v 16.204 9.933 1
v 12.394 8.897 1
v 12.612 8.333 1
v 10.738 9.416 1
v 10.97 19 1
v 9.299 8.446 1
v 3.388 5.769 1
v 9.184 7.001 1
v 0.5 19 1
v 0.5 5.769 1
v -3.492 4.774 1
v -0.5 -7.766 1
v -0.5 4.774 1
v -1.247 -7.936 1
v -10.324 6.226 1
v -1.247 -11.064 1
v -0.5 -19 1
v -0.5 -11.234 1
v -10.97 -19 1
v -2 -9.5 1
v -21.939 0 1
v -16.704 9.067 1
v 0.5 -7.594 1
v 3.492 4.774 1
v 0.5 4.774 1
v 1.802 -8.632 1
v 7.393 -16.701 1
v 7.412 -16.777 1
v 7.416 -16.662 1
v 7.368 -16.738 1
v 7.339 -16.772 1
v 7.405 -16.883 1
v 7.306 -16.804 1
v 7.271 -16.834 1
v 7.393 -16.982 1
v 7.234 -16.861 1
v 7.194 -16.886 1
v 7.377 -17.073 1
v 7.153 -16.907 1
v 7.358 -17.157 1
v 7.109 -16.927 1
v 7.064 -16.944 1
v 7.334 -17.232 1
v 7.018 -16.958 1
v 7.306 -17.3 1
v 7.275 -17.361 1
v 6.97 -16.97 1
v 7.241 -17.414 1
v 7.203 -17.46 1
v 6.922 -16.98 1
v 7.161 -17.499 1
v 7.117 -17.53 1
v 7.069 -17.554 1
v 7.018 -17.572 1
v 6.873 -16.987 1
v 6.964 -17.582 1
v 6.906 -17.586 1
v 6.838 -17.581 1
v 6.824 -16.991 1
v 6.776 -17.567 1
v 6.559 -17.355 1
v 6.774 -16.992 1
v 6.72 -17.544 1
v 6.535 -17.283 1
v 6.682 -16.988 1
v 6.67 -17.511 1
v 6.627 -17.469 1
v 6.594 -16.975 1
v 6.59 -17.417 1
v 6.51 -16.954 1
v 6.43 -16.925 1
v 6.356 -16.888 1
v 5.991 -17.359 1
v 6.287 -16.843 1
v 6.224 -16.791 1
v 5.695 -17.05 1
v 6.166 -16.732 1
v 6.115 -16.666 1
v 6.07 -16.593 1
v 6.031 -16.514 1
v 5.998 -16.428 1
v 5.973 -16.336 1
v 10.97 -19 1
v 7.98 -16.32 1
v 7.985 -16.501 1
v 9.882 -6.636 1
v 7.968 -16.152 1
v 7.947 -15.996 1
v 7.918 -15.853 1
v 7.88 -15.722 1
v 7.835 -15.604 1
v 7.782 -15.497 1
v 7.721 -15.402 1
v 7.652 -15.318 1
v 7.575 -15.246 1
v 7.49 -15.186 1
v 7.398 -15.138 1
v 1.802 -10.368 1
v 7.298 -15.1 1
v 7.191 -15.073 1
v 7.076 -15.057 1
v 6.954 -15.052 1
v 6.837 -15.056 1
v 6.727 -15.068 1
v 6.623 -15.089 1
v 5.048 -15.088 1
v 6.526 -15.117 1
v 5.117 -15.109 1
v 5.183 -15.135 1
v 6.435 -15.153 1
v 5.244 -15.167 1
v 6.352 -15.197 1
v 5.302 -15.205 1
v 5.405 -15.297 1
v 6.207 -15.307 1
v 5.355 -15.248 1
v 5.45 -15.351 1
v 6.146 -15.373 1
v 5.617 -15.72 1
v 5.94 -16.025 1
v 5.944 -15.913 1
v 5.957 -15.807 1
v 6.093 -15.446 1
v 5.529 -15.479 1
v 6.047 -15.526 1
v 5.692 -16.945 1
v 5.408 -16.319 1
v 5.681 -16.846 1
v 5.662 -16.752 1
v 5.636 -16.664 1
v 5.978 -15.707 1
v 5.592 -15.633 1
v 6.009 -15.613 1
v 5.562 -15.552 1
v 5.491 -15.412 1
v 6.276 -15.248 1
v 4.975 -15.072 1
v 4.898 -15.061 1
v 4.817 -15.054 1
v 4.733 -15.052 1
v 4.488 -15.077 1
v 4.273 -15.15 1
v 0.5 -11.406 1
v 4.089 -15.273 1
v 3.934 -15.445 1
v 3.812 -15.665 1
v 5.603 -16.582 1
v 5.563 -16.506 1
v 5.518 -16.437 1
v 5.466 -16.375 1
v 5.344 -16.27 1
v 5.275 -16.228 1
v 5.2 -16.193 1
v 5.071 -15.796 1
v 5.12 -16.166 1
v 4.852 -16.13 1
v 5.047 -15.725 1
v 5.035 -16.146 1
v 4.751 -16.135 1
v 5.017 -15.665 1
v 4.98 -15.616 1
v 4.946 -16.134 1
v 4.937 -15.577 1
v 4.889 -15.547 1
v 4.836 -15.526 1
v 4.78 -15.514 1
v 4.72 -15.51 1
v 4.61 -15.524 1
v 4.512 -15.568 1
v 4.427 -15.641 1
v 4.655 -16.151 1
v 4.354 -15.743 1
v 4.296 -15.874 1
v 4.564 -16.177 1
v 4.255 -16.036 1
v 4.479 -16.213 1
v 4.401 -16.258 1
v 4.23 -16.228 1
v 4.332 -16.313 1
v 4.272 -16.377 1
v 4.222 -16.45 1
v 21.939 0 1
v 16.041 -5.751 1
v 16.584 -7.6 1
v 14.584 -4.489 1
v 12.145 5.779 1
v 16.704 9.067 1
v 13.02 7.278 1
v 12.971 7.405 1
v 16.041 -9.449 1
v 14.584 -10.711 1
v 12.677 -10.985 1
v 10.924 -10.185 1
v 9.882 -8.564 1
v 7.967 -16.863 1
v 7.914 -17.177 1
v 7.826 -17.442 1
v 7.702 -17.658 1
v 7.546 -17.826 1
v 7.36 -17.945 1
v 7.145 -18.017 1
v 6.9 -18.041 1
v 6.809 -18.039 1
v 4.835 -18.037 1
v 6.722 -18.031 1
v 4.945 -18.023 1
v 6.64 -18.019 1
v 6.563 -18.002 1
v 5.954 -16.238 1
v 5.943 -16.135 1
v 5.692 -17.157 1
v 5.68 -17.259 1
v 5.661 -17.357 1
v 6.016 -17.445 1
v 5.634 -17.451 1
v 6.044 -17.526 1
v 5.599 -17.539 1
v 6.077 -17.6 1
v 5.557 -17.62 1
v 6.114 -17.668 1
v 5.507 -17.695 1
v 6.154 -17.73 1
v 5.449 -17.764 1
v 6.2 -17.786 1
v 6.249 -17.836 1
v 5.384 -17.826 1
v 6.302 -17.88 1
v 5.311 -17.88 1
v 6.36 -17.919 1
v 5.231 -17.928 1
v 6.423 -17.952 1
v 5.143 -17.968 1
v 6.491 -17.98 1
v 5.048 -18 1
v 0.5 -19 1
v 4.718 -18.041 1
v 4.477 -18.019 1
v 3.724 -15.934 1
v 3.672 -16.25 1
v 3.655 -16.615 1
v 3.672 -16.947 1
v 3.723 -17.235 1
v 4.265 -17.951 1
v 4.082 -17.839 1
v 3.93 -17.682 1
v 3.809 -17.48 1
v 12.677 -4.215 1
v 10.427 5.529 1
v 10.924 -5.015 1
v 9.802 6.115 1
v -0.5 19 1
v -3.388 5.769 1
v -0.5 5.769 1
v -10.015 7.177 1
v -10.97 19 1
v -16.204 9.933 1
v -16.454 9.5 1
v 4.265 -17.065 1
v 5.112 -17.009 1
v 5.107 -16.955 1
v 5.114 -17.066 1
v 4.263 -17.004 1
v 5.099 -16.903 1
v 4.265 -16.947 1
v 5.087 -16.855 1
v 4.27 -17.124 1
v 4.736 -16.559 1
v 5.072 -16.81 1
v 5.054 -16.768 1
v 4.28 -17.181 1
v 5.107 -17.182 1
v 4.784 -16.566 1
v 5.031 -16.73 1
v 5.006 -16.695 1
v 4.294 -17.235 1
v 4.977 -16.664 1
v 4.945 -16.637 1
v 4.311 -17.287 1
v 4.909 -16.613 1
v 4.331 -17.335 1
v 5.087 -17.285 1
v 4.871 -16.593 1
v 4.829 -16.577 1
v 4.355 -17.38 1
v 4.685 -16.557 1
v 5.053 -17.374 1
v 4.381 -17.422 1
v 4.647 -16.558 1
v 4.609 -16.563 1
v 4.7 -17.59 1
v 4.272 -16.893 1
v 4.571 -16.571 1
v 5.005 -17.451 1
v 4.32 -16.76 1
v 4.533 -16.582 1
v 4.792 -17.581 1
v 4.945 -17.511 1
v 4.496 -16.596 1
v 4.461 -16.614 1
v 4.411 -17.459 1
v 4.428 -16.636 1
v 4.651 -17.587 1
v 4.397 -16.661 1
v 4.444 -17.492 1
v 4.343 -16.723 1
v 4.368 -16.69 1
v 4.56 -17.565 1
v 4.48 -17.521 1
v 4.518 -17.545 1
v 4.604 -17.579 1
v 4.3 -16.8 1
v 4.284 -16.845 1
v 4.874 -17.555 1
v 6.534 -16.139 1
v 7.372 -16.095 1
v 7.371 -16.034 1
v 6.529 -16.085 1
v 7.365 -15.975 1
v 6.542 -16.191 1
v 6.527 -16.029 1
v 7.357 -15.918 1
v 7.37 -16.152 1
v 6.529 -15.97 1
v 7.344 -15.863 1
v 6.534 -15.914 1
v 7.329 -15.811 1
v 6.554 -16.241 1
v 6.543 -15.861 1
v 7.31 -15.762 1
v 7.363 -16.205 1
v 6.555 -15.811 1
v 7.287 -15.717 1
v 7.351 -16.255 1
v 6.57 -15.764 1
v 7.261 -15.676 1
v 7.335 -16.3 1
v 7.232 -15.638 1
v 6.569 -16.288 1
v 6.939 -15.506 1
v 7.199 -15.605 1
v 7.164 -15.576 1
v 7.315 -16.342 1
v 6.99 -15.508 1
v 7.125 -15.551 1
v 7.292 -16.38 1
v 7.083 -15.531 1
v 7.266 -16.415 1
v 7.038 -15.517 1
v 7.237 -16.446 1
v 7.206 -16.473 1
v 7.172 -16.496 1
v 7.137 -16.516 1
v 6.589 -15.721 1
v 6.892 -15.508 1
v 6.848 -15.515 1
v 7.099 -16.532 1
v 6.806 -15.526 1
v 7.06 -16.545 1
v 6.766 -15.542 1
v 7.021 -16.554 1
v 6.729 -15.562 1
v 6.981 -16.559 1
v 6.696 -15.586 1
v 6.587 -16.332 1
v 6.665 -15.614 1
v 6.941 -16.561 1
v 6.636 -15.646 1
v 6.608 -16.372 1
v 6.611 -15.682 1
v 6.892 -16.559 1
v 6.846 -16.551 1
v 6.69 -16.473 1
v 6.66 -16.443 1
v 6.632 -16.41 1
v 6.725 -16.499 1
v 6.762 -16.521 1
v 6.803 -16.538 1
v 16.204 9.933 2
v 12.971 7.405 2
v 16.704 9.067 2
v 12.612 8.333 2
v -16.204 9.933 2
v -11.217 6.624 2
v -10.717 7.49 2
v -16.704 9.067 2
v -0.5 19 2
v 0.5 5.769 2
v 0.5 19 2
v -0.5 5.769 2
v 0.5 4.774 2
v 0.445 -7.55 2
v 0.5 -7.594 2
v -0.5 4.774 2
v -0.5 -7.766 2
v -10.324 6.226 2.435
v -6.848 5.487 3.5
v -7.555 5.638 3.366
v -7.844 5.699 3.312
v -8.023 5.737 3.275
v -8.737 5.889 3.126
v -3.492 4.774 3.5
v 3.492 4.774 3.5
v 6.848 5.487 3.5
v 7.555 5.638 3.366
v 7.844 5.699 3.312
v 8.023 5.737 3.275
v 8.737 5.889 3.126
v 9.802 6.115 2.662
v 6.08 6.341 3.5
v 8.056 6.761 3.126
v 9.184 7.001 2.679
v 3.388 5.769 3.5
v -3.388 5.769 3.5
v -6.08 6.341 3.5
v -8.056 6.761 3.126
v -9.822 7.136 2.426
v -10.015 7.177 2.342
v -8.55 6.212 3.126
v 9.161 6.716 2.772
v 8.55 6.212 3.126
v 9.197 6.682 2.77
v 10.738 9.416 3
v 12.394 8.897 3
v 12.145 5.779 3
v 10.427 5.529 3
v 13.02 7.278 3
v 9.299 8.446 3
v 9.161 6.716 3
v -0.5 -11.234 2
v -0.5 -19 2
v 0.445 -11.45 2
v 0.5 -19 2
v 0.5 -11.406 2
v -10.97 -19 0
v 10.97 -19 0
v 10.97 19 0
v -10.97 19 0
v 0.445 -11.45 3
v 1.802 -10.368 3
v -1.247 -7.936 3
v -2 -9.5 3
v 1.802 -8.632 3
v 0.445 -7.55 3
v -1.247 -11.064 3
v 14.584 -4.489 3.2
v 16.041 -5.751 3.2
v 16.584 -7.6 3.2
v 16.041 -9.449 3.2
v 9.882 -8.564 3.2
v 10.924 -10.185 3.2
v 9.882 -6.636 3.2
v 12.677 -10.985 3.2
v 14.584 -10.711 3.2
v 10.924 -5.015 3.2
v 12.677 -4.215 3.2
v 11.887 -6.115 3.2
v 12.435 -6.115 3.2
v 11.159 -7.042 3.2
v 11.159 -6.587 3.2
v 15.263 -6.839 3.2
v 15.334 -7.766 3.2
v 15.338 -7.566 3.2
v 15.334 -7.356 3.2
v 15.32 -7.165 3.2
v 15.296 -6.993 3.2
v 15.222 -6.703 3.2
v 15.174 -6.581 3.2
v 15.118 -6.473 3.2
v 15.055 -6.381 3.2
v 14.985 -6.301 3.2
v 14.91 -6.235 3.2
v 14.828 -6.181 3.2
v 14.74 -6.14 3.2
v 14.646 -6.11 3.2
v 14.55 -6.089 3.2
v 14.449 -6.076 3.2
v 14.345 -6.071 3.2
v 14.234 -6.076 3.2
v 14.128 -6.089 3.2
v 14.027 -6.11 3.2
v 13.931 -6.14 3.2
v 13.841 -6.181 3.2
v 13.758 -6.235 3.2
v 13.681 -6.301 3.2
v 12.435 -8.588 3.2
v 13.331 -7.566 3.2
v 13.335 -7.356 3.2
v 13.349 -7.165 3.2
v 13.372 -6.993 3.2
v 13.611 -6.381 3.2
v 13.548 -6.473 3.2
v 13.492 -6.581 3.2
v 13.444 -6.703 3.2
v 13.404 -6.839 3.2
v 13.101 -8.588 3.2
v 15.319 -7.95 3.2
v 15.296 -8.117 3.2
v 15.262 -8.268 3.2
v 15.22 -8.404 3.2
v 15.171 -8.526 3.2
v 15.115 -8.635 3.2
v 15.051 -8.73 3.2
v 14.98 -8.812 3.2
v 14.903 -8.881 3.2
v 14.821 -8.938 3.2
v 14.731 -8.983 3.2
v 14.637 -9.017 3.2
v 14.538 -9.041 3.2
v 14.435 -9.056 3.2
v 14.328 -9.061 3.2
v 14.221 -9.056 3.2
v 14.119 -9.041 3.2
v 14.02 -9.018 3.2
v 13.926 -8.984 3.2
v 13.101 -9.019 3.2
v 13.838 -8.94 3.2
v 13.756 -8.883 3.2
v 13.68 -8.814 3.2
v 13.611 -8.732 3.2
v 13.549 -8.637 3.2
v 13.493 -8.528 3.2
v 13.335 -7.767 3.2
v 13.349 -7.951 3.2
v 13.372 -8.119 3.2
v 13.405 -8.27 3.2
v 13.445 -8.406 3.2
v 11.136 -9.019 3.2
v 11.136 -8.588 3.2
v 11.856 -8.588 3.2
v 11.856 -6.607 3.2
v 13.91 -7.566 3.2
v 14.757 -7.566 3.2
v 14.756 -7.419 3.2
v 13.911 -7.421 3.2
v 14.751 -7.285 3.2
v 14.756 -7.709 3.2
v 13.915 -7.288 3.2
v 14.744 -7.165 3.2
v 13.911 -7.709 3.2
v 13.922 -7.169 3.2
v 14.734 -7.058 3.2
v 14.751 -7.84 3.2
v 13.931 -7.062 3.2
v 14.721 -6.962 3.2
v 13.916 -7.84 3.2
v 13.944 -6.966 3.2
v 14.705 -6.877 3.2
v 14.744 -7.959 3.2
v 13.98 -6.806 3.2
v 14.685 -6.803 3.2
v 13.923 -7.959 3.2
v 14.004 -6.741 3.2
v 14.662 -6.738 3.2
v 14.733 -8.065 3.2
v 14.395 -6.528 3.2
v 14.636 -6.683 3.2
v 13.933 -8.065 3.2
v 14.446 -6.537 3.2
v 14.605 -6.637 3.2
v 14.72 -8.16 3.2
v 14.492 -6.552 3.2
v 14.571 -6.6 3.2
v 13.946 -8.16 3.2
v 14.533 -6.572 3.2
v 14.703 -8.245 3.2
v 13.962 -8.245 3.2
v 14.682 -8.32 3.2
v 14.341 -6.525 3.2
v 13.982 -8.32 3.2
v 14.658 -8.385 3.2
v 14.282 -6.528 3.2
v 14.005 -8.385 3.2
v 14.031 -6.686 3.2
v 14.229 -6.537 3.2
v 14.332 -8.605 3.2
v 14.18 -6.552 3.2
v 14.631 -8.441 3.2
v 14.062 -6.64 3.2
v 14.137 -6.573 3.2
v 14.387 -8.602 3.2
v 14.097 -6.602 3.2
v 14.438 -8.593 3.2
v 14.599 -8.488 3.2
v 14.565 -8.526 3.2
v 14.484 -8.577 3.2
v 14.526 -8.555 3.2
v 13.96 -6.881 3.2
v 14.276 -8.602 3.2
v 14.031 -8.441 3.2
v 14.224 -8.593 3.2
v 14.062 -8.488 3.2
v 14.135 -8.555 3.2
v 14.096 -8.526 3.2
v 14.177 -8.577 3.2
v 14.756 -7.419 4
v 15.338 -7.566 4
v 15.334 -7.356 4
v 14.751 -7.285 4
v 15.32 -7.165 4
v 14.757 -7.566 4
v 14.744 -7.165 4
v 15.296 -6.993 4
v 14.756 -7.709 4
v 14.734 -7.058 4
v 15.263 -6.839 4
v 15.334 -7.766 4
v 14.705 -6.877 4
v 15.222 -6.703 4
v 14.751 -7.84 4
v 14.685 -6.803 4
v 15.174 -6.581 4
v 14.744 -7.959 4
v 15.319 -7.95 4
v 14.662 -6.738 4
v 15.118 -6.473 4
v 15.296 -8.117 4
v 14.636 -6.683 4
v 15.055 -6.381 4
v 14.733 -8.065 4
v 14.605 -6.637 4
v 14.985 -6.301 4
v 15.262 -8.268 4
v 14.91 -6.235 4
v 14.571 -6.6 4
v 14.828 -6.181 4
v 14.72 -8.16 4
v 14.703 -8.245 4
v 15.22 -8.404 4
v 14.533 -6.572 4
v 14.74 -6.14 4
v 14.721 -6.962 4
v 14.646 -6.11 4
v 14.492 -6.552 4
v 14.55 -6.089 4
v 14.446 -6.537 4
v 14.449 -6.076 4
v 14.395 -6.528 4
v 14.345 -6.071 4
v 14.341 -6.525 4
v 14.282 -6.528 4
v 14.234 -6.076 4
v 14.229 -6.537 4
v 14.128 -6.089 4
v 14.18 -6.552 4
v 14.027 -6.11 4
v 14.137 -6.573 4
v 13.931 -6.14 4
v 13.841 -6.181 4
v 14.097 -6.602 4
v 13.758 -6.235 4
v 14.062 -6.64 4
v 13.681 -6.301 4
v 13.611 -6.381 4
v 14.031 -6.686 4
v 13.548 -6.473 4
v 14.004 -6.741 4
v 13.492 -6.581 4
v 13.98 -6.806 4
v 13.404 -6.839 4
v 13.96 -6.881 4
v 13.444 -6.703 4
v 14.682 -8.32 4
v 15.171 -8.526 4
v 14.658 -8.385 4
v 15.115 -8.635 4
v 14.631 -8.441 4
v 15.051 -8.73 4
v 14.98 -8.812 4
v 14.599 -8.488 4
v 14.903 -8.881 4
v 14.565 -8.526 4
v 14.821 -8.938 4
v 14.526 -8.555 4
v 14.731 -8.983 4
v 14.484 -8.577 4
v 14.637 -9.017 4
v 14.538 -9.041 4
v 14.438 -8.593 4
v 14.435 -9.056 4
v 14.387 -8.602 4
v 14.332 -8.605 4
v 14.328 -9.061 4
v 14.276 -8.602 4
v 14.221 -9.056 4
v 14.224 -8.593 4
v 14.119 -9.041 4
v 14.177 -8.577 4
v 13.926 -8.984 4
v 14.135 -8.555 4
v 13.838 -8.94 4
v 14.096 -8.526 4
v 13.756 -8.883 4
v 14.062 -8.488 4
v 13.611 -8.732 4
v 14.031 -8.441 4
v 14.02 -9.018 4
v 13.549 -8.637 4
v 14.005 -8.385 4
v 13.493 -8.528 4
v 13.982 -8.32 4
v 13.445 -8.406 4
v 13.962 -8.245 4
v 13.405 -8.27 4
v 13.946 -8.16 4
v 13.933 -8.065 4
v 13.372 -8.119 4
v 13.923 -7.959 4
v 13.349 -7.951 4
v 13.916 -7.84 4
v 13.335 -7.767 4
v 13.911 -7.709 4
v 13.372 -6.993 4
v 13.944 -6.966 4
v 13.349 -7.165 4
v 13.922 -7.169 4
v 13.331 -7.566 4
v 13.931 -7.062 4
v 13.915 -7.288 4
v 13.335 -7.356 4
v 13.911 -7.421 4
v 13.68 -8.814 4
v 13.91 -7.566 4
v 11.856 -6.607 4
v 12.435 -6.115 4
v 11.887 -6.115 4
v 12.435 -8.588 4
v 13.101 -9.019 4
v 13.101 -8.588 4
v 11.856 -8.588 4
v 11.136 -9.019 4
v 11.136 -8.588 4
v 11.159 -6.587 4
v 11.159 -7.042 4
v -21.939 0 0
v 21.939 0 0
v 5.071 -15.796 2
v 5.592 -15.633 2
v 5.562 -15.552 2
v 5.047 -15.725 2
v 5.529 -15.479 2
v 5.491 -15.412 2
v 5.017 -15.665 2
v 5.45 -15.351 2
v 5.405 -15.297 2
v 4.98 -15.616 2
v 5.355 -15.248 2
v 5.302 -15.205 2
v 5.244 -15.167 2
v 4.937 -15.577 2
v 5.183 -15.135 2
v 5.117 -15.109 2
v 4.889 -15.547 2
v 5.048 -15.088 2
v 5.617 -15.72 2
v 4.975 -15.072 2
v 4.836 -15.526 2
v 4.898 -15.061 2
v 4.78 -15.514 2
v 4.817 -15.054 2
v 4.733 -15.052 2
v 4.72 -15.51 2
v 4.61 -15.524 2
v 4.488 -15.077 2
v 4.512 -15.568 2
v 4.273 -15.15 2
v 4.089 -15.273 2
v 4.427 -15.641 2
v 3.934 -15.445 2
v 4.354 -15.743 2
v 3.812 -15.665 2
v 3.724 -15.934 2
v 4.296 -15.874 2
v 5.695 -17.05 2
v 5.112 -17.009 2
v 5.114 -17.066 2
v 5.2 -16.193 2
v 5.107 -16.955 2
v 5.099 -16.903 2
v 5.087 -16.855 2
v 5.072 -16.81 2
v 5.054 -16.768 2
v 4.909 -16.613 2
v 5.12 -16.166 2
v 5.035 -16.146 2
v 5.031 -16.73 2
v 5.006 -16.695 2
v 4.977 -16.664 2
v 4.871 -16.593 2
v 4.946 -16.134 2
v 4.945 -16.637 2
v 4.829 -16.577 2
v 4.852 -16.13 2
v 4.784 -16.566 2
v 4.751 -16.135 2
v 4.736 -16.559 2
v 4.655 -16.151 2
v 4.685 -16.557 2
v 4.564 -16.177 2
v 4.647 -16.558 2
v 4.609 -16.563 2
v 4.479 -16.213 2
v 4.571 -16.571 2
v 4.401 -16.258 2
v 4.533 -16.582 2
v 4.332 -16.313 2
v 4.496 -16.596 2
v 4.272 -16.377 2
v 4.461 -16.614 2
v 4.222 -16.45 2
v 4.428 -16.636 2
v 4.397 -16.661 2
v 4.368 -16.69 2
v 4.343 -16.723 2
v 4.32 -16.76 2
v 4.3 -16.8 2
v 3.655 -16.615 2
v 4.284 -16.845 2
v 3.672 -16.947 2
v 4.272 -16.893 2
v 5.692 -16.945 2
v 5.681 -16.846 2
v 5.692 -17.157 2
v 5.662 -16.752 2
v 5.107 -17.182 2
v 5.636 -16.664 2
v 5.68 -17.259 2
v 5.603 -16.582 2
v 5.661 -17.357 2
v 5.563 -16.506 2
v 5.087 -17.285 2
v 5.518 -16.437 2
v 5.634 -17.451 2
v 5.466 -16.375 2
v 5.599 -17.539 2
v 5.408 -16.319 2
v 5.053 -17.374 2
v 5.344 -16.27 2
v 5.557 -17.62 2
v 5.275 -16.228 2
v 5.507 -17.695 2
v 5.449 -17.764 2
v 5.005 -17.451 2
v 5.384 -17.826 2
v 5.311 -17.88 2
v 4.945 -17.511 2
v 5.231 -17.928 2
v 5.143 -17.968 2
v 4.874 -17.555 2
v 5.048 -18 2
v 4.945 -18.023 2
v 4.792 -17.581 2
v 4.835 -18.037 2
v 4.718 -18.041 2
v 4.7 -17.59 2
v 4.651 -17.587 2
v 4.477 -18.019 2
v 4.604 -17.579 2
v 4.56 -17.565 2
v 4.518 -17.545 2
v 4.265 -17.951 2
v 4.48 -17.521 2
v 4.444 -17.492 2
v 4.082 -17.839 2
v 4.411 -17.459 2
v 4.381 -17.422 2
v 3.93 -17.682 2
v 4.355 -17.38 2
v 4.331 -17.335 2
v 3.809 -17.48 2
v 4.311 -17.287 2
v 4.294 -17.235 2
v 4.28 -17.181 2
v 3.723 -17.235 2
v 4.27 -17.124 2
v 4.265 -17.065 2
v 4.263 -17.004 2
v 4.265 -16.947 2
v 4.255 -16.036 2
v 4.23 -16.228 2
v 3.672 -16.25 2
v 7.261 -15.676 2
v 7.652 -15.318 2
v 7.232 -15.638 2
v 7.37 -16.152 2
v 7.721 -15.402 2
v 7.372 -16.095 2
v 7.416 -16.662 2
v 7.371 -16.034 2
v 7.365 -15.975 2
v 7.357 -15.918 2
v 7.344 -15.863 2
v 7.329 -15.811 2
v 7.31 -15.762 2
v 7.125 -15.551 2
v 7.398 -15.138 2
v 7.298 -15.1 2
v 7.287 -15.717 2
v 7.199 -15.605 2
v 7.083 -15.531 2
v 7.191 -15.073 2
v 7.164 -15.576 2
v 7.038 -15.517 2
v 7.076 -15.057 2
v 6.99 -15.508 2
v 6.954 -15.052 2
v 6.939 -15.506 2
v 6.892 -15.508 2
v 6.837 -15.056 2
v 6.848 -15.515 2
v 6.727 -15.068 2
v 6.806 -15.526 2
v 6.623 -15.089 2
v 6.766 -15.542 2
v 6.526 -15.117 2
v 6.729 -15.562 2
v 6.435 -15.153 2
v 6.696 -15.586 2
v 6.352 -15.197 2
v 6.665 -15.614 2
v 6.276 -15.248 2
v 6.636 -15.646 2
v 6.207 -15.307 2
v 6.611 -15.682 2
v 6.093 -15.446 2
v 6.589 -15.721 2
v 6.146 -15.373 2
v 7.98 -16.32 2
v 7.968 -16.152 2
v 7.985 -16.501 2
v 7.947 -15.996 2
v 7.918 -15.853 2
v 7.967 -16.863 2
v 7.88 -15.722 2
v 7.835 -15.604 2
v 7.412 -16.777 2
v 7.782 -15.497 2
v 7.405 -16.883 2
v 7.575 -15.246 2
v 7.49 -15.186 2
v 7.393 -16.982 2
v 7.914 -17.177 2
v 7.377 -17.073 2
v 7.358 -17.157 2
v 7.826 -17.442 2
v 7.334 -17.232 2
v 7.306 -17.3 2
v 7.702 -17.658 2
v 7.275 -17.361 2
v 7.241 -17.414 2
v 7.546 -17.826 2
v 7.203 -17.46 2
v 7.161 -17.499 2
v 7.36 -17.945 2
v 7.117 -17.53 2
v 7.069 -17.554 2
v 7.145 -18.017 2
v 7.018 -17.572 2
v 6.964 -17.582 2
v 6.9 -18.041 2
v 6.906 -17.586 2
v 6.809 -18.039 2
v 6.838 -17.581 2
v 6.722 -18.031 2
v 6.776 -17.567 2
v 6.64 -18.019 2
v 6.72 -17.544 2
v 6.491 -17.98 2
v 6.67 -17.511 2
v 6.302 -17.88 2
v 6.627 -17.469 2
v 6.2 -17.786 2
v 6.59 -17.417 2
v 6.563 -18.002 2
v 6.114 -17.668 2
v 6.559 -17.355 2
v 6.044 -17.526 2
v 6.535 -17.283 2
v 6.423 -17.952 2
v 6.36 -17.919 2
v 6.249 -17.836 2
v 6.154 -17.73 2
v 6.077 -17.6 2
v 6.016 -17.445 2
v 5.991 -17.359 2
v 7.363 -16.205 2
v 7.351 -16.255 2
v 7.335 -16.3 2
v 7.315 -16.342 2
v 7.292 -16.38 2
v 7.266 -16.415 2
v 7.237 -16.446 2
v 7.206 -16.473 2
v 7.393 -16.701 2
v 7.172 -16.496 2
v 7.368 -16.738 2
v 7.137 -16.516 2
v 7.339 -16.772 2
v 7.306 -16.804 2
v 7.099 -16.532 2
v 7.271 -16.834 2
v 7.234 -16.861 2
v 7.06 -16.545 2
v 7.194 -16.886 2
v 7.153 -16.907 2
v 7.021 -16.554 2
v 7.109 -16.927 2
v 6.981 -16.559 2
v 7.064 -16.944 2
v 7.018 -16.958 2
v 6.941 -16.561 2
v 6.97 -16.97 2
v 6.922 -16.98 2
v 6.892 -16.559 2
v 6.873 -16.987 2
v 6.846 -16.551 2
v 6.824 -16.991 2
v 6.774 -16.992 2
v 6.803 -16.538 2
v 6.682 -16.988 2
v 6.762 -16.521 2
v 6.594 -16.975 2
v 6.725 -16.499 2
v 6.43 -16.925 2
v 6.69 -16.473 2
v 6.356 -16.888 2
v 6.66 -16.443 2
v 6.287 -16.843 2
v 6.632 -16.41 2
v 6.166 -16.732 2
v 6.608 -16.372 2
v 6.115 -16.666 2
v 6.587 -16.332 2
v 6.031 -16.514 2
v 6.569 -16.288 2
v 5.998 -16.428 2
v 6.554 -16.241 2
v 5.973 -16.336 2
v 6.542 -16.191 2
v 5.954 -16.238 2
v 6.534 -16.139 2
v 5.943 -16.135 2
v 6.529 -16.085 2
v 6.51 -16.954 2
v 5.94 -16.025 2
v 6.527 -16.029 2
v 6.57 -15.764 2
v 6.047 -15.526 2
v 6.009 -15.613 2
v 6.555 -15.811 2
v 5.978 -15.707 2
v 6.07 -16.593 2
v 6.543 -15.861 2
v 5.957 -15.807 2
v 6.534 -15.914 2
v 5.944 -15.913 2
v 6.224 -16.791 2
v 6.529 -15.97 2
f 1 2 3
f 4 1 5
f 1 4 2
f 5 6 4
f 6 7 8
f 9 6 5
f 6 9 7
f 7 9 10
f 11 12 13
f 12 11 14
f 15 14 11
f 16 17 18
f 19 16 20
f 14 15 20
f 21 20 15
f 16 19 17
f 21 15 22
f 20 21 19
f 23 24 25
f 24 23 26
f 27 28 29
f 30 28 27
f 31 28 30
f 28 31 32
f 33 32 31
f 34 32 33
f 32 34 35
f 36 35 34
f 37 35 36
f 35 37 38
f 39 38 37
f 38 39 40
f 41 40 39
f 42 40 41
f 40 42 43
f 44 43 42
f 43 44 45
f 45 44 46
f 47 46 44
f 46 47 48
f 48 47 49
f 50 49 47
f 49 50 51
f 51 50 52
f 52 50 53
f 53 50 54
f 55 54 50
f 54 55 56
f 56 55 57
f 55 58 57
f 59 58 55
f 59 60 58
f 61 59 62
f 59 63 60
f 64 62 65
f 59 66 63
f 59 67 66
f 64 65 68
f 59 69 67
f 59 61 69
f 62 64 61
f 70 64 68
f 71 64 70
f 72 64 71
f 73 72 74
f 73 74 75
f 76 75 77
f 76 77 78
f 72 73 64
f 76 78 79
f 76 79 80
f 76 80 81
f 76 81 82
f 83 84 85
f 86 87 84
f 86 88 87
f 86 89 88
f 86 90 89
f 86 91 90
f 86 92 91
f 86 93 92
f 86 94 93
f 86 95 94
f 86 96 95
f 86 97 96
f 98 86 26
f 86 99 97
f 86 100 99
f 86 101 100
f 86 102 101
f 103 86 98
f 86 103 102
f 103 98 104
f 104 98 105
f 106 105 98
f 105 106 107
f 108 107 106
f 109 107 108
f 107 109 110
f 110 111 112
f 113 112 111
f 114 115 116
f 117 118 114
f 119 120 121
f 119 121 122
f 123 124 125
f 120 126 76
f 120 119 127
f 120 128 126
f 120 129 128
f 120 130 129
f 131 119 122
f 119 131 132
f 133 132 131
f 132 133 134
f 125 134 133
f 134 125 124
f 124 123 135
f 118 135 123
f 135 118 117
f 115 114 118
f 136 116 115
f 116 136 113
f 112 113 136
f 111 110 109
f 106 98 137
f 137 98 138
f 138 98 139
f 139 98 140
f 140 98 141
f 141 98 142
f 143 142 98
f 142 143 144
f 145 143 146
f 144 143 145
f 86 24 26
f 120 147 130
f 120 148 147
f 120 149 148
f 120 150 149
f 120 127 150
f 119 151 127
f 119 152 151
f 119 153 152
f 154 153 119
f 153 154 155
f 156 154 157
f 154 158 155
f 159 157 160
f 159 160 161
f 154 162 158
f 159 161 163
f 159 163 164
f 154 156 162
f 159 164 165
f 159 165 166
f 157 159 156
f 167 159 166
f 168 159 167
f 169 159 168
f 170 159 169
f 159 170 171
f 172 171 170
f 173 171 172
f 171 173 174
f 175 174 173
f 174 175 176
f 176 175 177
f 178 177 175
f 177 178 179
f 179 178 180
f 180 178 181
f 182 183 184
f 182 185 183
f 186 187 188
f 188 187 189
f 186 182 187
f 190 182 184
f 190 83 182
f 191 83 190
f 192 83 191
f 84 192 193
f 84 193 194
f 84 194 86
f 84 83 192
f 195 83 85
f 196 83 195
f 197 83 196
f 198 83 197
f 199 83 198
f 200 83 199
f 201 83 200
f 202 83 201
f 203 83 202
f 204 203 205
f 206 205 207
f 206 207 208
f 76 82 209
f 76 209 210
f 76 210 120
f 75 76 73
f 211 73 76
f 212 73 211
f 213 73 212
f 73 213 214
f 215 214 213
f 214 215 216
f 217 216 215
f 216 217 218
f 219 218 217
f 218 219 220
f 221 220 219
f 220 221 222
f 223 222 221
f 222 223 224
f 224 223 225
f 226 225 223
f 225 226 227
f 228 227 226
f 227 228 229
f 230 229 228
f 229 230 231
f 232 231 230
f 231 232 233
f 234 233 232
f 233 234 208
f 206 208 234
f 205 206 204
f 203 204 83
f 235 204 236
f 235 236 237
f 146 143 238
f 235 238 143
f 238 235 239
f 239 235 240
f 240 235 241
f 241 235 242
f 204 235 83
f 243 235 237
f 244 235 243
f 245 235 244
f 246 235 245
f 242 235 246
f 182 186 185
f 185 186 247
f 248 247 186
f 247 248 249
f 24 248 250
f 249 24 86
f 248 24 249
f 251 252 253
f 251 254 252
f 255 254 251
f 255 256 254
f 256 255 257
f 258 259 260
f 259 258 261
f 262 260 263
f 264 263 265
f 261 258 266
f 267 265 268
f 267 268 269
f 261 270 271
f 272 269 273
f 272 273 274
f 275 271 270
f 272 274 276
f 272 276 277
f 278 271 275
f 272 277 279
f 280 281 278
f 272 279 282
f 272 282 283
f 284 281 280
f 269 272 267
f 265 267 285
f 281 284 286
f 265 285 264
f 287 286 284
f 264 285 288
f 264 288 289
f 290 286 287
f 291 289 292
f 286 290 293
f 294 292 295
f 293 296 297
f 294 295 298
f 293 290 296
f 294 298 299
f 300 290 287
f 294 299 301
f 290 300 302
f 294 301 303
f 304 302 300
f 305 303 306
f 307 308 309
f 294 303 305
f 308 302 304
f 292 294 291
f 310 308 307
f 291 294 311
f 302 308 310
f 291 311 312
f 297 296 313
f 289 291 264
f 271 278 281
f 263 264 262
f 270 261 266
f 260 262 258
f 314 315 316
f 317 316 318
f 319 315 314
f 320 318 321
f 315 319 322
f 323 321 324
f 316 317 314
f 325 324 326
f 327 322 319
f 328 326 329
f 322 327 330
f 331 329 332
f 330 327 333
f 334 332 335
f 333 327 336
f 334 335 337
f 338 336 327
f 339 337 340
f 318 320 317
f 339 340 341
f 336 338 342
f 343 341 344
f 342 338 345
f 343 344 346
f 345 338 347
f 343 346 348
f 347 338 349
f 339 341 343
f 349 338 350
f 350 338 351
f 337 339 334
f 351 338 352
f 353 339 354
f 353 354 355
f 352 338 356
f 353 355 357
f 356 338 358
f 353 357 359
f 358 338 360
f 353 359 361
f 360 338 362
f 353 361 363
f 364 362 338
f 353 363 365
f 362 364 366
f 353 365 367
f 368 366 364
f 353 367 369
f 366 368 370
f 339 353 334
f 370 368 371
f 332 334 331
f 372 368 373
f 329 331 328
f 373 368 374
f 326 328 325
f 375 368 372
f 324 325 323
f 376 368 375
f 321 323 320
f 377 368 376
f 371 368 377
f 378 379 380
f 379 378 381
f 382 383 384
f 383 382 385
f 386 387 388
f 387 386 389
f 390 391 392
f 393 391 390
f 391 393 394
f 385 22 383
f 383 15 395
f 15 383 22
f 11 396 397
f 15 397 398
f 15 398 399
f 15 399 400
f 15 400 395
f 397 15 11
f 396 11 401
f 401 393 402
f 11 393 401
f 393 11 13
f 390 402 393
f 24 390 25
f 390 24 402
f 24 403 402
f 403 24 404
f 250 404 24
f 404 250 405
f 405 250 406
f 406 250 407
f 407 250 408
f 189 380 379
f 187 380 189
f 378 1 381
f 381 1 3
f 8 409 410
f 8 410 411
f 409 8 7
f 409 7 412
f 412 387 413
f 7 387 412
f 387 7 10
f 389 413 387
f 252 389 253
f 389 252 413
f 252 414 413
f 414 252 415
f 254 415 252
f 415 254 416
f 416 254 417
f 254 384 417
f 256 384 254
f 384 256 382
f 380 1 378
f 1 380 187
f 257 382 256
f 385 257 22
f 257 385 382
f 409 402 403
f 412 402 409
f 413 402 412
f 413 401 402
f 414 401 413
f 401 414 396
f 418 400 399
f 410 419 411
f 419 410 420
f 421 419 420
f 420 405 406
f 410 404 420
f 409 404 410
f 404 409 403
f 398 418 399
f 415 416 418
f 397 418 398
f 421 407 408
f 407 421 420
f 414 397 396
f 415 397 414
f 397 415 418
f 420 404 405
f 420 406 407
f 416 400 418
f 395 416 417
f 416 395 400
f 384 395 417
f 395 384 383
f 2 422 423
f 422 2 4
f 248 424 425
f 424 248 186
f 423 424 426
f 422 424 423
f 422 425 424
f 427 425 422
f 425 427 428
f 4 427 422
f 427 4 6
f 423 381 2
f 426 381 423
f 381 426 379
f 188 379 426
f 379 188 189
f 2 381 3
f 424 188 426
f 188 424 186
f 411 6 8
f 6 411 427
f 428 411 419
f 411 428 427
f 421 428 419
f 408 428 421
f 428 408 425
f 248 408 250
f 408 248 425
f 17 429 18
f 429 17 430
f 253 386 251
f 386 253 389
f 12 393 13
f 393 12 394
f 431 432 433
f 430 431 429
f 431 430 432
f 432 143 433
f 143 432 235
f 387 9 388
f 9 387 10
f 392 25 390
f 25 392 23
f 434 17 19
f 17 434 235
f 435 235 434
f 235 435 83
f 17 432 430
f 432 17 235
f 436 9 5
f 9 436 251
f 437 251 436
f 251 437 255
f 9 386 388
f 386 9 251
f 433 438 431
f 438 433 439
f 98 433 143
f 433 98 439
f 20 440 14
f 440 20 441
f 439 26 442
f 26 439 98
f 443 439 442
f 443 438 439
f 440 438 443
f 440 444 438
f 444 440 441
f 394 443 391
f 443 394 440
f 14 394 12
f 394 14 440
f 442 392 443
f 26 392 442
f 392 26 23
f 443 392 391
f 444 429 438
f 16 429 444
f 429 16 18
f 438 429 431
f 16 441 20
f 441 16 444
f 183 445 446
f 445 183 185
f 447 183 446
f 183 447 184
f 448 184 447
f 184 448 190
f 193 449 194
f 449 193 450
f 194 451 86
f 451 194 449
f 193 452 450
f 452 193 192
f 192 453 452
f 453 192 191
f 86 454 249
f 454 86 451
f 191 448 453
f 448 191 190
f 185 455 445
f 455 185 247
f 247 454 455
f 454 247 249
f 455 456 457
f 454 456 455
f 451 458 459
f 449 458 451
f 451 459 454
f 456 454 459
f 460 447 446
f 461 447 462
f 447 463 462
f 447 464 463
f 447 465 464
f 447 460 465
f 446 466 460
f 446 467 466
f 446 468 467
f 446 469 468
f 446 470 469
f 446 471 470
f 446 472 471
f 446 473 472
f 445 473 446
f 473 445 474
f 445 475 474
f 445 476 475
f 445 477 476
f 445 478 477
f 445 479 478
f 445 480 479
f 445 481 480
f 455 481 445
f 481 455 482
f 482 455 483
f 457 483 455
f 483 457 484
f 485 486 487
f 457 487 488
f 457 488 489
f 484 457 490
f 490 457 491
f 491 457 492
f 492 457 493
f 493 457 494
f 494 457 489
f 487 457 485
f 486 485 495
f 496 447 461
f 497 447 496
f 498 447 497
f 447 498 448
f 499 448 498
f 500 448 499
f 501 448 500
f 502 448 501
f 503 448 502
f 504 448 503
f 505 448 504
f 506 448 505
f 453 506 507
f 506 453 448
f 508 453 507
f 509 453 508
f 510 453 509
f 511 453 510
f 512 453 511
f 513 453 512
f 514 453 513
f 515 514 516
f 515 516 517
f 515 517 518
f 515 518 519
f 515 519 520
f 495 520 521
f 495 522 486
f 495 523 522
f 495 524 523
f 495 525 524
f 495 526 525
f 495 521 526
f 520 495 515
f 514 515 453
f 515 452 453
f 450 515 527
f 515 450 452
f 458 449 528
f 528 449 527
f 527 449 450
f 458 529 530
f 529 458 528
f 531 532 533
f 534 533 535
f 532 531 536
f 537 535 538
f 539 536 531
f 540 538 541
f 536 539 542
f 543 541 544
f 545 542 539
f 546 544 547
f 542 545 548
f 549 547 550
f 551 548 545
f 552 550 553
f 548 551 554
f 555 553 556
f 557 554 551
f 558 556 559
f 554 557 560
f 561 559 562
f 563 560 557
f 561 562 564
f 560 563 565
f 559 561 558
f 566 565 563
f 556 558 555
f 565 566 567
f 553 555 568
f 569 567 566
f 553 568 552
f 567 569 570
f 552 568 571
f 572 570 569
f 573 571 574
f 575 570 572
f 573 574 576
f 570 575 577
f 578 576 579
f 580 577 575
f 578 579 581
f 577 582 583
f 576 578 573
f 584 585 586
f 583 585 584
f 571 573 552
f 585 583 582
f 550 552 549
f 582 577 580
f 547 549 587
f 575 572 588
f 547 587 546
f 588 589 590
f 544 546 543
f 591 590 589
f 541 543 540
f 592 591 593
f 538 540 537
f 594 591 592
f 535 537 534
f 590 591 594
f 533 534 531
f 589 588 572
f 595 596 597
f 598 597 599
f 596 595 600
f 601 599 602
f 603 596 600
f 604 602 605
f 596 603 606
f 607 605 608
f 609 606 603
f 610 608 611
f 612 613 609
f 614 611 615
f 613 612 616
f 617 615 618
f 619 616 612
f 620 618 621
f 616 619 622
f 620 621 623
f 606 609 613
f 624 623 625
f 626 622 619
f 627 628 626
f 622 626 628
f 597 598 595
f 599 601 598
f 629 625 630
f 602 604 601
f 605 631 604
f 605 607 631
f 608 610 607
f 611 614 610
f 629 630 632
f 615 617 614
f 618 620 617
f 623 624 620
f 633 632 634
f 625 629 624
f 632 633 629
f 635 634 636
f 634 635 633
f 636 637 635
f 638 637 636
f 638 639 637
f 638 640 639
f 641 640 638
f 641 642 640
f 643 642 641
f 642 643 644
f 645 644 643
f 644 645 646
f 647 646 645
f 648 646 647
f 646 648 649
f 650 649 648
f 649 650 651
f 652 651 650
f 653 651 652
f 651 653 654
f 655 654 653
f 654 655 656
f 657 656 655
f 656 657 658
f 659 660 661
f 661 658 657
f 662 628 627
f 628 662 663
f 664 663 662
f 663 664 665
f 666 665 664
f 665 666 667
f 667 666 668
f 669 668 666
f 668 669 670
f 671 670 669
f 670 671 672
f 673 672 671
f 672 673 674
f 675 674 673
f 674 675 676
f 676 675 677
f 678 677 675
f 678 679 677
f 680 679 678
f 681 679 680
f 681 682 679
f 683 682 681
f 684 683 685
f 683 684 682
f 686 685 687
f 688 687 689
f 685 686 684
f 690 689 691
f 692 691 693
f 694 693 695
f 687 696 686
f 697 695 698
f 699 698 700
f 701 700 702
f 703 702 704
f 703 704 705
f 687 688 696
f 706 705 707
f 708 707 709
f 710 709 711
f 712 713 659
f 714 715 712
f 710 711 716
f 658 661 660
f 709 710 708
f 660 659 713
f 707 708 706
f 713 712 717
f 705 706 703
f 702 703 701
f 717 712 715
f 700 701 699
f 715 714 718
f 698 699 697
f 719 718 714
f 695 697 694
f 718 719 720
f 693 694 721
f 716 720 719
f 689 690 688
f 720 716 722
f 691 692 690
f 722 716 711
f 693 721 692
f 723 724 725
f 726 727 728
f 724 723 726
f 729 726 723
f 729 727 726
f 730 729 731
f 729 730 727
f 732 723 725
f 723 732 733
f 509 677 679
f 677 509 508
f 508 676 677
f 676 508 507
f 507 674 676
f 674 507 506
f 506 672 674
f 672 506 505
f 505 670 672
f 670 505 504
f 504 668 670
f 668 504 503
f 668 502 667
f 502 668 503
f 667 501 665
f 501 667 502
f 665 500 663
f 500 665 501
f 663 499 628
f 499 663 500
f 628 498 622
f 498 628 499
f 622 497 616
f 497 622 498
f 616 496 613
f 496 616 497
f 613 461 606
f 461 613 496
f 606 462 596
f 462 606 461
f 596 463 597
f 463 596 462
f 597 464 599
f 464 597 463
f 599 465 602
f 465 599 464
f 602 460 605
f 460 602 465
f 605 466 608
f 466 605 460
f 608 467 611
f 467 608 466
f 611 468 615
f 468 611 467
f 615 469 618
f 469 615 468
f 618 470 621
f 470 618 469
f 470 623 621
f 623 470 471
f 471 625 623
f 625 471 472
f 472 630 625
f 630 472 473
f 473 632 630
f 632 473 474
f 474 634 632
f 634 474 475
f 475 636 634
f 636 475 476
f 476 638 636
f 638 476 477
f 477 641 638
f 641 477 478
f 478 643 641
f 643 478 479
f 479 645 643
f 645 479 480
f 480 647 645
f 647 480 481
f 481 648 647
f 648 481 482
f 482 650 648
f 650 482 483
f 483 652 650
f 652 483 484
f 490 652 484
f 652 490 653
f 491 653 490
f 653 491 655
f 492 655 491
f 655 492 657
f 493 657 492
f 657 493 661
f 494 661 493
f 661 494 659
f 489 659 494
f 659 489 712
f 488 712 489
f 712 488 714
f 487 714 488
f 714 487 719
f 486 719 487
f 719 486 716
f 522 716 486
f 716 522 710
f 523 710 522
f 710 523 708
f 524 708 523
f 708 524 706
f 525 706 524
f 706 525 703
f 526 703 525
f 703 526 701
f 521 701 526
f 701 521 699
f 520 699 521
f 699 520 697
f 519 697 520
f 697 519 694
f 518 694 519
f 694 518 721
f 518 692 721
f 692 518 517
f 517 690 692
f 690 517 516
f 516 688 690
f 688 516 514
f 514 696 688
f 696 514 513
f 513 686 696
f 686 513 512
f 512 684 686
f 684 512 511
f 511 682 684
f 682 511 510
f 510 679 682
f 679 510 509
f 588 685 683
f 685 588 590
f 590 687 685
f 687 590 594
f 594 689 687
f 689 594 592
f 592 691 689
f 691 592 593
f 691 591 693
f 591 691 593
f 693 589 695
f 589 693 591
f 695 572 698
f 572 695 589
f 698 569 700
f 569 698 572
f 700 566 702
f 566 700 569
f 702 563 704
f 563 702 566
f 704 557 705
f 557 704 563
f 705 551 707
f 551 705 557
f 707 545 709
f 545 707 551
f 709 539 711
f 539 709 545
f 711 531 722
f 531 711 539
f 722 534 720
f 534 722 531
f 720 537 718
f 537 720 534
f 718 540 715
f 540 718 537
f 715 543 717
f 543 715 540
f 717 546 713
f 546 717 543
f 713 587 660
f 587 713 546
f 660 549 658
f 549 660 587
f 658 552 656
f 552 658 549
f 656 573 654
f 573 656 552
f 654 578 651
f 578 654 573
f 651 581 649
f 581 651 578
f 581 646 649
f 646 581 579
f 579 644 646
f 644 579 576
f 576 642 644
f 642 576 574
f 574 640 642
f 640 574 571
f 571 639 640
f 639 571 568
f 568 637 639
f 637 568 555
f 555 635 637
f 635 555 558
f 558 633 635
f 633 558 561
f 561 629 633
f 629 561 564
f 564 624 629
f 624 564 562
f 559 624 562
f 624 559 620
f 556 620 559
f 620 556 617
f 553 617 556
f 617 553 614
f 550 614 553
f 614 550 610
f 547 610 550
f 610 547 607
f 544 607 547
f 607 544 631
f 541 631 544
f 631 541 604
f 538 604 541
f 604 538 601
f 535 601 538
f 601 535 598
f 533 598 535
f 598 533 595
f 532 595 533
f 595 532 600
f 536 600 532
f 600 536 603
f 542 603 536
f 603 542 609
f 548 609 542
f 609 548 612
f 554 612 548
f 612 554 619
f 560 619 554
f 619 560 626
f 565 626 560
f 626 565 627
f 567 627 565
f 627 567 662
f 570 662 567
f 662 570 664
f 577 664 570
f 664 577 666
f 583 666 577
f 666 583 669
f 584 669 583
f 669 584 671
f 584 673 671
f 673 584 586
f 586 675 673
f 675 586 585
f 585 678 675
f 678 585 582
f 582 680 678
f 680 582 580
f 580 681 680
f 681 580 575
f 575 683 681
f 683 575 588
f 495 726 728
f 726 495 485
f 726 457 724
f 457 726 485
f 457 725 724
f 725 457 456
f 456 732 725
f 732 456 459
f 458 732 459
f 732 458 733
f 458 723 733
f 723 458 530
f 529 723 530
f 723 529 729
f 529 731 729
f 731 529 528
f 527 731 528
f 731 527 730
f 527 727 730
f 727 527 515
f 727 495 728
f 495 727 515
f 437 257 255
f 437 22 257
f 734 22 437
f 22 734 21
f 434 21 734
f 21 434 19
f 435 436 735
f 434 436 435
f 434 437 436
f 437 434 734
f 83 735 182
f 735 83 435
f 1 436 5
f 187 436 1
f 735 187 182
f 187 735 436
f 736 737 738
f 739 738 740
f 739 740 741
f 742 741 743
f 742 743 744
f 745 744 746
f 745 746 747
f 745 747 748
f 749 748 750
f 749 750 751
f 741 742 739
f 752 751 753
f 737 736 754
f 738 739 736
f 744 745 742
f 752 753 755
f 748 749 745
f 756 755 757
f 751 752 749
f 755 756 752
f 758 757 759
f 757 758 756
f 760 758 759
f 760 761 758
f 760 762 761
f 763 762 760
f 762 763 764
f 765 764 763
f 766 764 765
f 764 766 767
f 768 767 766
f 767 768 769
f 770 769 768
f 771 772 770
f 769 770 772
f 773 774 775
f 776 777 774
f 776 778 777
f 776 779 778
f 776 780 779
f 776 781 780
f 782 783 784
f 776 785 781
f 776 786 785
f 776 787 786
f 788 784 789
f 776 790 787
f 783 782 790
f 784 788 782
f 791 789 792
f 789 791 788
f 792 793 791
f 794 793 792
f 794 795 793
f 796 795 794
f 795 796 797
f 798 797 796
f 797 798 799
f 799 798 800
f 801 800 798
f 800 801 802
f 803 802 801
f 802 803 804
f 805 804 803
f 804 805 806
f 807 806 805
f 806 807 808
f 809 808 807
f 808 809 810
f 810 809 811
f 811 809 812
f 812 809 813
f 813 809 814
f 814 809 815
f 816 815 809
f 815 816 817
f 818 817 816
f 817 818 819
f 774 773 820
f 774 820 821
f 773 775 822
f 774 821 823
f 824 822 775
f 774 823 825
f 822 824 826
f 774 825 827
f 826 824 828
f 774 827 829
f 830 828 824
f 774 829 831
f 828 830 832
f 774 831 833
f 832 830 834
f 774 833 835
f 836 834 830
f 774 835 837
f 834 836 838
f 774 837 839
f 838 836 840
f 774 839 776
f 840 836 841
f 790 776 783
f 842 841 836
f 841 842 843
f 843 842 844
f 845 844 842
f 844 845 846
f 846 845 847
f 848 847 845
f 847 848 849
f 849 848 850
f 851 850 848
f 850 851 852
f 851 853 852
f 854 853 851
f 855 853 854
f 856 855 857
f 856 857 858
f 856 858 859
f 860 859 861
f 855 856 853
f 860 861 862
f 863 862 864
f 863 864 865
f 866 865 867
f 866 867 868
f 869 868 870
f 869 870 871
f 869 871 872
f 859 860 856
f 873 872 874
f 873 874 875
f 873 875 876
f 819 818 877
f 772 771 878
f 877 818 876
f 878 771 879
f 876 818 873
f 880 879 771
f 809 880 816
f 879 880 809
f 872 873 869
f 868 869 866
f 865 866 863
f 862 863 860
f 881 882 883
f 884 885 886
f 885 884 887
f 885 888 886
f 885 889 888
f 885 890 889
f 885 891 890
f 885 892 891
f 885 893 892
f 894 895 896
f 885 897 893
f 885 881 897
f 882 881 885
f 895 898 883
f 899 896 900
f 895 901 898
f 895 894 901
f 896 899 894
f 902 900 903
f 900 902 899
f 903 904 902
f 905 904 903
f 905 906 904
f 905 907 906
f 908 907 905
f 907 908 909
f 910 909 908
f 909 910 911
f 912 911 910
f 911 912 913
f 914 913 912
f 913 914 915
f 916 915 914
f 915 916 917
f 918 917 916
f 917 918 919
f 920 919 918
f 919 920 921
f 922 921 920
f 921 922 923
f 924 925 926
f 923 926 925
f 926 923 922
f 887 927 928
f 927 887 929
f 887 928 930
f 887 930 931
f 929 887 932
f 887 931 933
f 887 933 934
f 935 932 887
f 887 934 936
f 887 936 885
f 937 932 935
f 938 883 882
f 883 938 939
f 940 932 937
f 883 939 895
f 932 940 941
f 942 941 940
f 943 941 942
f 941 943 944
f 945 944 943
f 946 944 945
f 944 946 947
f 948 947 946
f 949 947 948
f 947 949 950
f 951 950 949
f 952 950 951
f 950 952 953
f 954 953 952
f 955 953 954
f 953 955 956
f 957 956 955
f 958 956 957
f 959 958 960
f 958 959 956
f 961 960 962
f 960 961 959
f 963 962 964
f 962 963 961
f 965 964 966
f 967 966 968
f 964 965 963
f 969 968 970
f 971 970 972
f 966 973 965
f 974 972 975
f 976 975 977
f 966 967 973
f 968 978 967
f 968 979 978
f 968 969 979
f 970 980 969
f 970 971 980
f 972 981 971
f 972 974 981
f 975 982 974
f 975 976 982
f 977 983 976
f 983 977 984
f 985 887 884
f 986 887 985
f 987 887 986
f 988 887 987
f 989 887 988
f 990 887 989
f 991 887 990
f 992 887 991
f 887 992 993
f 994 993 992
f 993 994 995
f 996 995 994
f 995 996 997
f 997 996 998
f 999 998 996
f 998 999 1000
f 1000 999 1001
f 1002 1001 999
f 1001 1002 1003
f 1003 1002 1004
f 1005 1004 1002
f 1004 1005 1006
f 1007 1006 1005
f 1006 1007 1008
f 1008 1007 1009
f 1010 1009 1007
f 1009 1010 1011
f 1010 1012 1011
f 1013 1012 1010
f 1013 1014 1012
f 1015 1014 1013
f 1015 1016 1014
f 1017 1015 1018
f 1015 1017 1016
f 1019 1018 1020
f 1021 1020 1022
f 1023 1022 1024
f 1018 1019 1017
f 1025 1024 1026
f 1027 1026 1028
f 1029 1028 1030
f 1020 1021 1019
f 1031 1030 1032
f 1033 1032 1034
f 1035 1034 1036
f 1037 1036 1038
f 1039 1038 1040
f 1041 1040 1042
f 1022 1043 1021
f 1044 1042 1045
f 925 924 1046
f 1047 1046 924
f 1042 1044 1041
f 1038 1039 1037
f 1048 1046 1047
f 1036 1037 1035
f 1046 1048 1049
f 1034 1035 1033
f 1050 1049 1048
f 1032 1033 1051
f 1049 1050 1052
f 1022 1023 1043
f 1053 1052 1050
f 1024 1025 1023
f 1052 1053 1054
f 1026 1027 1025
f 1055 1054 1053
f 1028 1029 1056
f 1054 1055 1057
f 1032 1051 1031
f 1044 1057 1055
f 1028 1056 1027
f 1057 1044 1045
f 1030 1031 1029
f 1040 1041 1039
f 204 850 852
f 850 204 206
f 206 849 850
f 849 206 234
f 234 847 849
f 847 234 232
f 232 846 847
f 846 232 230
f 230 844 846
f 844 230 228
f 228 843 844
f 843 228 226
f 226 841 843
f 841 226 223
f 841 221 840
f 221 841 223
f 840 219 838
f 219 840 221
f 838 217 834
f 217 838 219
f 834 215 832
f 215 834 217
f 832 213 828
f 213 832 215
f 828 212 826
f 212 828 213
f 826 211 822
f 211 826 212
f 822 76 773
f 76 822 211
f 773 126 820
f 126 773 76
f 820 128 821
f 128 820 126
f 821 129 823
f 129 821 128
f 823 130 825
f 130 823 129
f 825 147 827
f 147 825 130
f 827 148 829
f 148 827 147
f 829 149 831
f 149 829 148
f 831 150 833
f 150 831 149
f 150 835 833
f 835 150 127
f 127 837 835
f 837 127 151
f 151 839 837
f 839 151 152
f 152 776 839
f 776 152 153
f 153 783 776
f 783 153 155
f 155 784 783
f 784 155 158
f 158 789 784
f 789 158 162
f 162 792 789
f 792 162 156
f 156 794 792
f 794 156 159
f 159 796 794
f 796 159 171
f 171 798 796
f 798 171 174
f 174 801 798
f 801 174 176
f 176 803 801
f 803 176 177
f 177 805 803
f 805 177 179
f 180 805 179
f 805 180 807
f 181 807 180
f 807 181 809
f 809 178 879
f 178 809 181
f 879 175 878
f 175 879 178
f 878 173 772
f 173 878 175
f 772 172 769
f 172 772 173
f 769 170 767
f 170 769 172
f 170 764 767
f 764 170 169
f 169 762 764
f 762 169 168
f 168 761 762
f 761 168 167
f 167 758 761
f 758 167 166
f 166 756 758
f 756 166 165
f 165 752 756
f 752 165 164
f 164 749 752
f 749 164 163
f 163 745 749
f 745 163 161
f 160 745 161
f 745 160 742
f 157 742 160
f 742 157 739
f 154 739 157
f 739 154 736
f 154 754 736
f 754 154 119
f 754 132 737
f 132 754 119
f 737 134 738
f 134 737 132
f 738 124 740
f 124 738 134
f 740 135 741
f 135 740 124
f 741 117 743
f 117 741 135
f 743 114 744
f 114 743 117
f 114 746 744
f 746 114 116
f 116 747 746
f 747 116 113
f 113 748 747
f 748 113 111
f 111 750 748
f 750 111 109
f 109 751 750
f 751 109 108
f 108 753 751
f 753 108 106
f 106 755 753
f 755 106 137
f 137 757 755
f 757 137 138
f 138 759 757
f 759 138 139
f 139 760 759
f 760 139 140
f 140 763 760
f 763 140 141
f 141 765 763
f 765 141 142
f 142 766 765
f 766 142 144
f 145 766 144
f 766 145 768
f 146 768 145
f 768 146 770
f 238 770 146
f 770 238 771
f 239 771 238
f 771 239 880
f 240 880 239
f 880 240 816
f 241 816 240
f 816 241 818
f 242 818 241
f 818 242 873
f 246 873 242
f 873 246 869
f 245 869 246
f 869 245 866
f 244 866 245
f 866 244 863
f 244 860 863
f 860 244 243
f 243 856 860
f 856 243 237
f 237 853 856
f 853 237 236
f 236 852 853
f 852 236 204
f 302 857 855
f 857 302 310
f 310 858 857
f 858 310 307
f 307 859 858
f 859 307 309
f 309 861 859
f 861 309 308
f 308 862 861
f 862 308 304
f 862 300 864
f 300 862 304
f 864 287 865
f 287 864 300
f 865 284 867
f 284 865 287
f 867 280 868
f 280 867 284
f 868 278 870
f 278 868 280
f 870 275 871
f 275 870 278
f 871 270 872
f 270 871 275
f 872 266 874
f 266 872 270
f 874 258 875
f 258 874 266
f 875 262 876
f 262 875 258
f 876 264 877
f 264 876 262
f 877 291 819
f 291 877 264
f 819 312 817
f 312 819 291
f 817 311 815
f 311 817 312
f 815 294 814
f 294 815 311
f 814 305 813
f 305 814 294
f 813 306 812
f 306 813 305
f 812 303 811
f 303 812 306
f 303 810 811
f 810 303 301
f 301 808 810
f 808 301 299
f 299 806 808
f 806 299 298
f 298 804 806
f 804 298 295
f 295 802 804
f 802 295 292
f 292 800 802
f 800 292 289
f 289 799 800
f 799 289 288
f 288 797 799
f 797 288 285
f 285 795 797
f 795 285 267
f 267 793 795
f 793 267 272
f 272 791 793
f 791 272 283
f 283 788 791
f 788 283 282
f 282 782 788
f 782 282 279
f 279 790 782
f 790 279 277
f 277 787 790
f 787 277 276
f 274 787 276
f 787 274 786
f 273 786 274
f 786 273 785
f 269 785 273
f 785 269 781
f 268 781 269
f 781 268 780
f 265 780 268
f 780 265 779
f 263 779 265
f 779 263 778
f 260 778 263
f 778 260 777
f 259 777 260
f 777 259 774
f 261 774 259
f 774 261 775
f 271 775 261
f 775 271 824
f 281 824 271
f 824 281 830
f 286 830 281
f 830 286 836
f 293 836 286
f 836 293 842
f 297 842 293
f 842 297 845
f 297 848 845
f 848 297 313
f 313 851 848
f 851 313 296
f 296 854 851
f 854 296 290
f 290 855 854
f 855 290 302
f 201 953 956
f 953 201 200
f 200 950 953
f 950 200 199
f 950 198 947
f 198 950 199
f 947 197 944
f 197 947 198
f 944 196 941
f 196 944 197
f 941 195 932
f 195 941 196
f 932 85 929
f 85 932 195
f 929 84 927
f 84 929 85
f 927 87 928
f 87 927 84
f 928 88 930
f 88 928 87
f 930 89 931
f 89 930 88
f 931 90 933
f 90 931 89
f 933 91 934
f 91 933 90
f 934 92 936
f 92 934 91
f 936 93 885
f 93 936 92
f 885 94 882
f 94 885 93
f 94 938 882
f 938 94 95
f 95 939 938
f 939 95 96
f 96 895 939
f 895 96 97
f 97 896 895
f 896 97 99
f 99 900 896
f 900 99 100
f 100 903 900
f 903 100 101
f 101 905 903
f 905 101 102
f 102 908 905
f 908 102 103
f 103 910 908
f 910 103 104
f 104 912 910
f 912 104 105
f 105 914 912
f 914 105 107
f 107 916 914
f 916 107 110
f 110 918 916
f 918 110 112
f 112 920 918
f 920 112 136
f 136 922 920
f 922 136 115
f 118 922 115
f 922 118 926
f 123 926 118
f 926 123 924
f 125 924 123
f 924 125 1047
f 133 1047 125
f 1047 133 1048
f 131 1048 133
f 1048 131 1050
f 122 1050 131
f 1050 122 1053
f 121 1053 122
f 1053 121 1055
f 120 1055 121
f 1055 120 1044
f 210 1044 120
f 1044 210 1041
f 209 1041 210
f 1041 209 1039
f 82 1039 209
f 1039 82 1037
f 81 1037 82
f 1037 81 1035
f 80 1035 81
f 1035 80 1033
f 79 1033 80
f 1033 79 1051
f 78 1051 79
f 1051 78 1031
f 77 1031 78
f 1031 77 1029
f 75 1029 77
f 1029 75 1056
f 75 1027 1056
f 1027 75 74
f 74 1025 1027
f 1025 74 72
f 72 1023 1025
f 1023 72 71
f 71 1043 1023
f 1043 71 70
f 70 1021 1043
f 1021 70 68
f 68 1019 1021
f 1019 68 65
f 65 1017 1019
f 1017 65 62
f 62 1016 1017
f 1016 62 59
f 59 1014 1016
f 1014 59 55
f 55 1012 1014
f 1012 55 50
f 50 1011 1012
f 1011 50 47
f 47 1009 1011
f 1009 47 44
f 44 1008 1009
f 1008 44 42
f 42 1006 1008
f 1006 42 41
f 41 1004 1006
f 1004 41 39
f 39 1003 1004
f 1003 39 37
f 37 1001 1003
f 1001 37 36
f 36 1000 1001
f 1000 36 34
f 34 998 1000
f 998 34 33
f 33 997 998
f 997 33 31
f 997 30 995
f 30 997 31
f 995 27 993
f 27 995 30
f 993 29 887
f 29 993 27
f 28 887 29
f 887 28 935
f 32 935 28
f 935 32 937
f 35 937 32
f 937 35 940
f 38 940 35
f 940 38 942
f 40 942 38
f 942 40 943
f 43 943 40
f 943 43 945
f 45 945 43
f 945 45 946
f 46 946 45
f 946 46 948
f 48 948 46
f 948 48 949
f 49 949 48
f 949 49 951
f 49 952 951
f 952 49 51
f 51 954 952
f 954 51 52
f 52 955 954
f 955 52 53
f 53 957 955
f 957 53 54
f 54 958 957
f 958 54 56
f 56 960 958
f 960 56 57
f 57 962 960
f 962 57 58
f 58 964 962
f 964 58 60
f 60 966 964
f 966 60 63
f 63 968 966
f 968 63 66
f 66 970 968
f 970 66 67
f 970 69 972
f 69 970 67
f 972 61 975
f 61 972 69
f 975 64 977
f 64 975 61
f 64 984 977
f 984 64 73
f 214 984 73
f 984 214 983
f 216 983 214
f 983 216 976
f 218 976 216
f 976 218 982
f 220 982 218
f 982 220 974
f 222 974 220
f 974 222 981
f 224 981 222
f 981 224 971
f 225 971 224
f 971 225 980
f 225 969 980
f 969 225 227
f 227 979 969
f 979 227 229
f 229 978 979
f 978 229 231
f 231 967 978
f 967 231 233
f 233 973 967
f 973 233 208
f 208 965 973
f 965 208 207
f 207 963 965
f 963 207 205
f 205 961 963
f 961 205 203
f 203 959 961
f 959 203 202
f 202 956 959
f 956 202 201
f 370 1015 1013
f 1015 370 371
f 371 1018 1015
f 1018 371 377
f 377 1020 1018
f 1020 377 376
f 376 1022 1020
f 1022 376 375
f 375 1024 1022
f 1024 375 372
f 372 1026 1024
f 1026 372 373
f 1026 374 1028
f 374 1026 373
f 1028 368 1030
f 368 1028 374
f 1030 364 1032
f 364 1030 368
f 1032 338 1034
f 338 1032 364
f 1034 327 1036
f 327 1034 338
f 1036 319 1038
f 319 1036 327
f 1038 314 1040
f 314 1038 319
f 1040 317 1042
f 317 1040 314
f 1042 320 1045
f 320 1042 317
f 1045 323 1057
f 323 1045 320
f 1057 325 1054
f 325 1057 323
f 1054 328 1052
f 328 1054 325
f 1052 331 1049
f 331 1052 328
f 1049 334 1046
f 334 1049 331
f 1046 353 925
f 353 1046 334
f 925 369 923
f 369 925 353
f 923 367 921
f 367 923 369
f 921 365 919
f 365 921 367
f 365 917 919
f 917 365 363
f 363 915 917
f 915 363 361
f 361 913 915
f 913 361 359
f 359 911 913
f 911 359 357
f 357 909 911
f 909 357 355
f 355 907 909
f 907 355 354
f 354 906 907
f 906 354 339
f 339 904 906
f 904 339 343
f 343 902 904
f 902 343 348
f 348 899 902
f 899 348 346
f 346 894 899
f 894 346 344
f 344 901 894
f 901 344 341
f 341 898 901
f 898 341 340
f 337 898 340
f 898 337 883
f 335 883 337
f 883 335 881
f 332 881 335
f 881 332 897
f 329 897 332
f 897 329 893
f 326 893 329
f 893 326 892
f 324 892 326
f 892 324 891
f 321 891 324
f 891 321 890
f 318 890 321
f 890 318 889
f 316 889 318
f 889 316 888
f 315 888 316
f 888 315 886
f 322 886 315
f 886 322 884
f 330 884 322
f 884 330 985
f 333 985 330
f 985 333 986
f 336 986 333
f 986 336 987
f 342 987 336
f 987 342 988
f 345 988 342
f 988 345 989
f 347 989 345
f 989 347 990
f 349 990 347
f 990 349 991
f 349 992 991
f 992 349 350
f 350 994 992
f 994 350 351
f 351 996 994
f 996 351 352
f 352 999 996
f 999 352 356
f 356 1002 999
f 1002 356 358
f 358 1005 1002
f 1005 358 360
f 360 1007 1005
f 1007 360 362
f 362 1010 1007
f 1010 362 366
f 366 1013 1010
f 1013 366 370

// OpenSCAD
include <../Scripts/18xx tiles basic functions.scad>
hex();
put_tilenr("69");
light_curve_bridge(r=2);
small_town_light_curve2(r=2);
small_town_straight(r=3,dist=hex_size/2);
put_value("10",120);
